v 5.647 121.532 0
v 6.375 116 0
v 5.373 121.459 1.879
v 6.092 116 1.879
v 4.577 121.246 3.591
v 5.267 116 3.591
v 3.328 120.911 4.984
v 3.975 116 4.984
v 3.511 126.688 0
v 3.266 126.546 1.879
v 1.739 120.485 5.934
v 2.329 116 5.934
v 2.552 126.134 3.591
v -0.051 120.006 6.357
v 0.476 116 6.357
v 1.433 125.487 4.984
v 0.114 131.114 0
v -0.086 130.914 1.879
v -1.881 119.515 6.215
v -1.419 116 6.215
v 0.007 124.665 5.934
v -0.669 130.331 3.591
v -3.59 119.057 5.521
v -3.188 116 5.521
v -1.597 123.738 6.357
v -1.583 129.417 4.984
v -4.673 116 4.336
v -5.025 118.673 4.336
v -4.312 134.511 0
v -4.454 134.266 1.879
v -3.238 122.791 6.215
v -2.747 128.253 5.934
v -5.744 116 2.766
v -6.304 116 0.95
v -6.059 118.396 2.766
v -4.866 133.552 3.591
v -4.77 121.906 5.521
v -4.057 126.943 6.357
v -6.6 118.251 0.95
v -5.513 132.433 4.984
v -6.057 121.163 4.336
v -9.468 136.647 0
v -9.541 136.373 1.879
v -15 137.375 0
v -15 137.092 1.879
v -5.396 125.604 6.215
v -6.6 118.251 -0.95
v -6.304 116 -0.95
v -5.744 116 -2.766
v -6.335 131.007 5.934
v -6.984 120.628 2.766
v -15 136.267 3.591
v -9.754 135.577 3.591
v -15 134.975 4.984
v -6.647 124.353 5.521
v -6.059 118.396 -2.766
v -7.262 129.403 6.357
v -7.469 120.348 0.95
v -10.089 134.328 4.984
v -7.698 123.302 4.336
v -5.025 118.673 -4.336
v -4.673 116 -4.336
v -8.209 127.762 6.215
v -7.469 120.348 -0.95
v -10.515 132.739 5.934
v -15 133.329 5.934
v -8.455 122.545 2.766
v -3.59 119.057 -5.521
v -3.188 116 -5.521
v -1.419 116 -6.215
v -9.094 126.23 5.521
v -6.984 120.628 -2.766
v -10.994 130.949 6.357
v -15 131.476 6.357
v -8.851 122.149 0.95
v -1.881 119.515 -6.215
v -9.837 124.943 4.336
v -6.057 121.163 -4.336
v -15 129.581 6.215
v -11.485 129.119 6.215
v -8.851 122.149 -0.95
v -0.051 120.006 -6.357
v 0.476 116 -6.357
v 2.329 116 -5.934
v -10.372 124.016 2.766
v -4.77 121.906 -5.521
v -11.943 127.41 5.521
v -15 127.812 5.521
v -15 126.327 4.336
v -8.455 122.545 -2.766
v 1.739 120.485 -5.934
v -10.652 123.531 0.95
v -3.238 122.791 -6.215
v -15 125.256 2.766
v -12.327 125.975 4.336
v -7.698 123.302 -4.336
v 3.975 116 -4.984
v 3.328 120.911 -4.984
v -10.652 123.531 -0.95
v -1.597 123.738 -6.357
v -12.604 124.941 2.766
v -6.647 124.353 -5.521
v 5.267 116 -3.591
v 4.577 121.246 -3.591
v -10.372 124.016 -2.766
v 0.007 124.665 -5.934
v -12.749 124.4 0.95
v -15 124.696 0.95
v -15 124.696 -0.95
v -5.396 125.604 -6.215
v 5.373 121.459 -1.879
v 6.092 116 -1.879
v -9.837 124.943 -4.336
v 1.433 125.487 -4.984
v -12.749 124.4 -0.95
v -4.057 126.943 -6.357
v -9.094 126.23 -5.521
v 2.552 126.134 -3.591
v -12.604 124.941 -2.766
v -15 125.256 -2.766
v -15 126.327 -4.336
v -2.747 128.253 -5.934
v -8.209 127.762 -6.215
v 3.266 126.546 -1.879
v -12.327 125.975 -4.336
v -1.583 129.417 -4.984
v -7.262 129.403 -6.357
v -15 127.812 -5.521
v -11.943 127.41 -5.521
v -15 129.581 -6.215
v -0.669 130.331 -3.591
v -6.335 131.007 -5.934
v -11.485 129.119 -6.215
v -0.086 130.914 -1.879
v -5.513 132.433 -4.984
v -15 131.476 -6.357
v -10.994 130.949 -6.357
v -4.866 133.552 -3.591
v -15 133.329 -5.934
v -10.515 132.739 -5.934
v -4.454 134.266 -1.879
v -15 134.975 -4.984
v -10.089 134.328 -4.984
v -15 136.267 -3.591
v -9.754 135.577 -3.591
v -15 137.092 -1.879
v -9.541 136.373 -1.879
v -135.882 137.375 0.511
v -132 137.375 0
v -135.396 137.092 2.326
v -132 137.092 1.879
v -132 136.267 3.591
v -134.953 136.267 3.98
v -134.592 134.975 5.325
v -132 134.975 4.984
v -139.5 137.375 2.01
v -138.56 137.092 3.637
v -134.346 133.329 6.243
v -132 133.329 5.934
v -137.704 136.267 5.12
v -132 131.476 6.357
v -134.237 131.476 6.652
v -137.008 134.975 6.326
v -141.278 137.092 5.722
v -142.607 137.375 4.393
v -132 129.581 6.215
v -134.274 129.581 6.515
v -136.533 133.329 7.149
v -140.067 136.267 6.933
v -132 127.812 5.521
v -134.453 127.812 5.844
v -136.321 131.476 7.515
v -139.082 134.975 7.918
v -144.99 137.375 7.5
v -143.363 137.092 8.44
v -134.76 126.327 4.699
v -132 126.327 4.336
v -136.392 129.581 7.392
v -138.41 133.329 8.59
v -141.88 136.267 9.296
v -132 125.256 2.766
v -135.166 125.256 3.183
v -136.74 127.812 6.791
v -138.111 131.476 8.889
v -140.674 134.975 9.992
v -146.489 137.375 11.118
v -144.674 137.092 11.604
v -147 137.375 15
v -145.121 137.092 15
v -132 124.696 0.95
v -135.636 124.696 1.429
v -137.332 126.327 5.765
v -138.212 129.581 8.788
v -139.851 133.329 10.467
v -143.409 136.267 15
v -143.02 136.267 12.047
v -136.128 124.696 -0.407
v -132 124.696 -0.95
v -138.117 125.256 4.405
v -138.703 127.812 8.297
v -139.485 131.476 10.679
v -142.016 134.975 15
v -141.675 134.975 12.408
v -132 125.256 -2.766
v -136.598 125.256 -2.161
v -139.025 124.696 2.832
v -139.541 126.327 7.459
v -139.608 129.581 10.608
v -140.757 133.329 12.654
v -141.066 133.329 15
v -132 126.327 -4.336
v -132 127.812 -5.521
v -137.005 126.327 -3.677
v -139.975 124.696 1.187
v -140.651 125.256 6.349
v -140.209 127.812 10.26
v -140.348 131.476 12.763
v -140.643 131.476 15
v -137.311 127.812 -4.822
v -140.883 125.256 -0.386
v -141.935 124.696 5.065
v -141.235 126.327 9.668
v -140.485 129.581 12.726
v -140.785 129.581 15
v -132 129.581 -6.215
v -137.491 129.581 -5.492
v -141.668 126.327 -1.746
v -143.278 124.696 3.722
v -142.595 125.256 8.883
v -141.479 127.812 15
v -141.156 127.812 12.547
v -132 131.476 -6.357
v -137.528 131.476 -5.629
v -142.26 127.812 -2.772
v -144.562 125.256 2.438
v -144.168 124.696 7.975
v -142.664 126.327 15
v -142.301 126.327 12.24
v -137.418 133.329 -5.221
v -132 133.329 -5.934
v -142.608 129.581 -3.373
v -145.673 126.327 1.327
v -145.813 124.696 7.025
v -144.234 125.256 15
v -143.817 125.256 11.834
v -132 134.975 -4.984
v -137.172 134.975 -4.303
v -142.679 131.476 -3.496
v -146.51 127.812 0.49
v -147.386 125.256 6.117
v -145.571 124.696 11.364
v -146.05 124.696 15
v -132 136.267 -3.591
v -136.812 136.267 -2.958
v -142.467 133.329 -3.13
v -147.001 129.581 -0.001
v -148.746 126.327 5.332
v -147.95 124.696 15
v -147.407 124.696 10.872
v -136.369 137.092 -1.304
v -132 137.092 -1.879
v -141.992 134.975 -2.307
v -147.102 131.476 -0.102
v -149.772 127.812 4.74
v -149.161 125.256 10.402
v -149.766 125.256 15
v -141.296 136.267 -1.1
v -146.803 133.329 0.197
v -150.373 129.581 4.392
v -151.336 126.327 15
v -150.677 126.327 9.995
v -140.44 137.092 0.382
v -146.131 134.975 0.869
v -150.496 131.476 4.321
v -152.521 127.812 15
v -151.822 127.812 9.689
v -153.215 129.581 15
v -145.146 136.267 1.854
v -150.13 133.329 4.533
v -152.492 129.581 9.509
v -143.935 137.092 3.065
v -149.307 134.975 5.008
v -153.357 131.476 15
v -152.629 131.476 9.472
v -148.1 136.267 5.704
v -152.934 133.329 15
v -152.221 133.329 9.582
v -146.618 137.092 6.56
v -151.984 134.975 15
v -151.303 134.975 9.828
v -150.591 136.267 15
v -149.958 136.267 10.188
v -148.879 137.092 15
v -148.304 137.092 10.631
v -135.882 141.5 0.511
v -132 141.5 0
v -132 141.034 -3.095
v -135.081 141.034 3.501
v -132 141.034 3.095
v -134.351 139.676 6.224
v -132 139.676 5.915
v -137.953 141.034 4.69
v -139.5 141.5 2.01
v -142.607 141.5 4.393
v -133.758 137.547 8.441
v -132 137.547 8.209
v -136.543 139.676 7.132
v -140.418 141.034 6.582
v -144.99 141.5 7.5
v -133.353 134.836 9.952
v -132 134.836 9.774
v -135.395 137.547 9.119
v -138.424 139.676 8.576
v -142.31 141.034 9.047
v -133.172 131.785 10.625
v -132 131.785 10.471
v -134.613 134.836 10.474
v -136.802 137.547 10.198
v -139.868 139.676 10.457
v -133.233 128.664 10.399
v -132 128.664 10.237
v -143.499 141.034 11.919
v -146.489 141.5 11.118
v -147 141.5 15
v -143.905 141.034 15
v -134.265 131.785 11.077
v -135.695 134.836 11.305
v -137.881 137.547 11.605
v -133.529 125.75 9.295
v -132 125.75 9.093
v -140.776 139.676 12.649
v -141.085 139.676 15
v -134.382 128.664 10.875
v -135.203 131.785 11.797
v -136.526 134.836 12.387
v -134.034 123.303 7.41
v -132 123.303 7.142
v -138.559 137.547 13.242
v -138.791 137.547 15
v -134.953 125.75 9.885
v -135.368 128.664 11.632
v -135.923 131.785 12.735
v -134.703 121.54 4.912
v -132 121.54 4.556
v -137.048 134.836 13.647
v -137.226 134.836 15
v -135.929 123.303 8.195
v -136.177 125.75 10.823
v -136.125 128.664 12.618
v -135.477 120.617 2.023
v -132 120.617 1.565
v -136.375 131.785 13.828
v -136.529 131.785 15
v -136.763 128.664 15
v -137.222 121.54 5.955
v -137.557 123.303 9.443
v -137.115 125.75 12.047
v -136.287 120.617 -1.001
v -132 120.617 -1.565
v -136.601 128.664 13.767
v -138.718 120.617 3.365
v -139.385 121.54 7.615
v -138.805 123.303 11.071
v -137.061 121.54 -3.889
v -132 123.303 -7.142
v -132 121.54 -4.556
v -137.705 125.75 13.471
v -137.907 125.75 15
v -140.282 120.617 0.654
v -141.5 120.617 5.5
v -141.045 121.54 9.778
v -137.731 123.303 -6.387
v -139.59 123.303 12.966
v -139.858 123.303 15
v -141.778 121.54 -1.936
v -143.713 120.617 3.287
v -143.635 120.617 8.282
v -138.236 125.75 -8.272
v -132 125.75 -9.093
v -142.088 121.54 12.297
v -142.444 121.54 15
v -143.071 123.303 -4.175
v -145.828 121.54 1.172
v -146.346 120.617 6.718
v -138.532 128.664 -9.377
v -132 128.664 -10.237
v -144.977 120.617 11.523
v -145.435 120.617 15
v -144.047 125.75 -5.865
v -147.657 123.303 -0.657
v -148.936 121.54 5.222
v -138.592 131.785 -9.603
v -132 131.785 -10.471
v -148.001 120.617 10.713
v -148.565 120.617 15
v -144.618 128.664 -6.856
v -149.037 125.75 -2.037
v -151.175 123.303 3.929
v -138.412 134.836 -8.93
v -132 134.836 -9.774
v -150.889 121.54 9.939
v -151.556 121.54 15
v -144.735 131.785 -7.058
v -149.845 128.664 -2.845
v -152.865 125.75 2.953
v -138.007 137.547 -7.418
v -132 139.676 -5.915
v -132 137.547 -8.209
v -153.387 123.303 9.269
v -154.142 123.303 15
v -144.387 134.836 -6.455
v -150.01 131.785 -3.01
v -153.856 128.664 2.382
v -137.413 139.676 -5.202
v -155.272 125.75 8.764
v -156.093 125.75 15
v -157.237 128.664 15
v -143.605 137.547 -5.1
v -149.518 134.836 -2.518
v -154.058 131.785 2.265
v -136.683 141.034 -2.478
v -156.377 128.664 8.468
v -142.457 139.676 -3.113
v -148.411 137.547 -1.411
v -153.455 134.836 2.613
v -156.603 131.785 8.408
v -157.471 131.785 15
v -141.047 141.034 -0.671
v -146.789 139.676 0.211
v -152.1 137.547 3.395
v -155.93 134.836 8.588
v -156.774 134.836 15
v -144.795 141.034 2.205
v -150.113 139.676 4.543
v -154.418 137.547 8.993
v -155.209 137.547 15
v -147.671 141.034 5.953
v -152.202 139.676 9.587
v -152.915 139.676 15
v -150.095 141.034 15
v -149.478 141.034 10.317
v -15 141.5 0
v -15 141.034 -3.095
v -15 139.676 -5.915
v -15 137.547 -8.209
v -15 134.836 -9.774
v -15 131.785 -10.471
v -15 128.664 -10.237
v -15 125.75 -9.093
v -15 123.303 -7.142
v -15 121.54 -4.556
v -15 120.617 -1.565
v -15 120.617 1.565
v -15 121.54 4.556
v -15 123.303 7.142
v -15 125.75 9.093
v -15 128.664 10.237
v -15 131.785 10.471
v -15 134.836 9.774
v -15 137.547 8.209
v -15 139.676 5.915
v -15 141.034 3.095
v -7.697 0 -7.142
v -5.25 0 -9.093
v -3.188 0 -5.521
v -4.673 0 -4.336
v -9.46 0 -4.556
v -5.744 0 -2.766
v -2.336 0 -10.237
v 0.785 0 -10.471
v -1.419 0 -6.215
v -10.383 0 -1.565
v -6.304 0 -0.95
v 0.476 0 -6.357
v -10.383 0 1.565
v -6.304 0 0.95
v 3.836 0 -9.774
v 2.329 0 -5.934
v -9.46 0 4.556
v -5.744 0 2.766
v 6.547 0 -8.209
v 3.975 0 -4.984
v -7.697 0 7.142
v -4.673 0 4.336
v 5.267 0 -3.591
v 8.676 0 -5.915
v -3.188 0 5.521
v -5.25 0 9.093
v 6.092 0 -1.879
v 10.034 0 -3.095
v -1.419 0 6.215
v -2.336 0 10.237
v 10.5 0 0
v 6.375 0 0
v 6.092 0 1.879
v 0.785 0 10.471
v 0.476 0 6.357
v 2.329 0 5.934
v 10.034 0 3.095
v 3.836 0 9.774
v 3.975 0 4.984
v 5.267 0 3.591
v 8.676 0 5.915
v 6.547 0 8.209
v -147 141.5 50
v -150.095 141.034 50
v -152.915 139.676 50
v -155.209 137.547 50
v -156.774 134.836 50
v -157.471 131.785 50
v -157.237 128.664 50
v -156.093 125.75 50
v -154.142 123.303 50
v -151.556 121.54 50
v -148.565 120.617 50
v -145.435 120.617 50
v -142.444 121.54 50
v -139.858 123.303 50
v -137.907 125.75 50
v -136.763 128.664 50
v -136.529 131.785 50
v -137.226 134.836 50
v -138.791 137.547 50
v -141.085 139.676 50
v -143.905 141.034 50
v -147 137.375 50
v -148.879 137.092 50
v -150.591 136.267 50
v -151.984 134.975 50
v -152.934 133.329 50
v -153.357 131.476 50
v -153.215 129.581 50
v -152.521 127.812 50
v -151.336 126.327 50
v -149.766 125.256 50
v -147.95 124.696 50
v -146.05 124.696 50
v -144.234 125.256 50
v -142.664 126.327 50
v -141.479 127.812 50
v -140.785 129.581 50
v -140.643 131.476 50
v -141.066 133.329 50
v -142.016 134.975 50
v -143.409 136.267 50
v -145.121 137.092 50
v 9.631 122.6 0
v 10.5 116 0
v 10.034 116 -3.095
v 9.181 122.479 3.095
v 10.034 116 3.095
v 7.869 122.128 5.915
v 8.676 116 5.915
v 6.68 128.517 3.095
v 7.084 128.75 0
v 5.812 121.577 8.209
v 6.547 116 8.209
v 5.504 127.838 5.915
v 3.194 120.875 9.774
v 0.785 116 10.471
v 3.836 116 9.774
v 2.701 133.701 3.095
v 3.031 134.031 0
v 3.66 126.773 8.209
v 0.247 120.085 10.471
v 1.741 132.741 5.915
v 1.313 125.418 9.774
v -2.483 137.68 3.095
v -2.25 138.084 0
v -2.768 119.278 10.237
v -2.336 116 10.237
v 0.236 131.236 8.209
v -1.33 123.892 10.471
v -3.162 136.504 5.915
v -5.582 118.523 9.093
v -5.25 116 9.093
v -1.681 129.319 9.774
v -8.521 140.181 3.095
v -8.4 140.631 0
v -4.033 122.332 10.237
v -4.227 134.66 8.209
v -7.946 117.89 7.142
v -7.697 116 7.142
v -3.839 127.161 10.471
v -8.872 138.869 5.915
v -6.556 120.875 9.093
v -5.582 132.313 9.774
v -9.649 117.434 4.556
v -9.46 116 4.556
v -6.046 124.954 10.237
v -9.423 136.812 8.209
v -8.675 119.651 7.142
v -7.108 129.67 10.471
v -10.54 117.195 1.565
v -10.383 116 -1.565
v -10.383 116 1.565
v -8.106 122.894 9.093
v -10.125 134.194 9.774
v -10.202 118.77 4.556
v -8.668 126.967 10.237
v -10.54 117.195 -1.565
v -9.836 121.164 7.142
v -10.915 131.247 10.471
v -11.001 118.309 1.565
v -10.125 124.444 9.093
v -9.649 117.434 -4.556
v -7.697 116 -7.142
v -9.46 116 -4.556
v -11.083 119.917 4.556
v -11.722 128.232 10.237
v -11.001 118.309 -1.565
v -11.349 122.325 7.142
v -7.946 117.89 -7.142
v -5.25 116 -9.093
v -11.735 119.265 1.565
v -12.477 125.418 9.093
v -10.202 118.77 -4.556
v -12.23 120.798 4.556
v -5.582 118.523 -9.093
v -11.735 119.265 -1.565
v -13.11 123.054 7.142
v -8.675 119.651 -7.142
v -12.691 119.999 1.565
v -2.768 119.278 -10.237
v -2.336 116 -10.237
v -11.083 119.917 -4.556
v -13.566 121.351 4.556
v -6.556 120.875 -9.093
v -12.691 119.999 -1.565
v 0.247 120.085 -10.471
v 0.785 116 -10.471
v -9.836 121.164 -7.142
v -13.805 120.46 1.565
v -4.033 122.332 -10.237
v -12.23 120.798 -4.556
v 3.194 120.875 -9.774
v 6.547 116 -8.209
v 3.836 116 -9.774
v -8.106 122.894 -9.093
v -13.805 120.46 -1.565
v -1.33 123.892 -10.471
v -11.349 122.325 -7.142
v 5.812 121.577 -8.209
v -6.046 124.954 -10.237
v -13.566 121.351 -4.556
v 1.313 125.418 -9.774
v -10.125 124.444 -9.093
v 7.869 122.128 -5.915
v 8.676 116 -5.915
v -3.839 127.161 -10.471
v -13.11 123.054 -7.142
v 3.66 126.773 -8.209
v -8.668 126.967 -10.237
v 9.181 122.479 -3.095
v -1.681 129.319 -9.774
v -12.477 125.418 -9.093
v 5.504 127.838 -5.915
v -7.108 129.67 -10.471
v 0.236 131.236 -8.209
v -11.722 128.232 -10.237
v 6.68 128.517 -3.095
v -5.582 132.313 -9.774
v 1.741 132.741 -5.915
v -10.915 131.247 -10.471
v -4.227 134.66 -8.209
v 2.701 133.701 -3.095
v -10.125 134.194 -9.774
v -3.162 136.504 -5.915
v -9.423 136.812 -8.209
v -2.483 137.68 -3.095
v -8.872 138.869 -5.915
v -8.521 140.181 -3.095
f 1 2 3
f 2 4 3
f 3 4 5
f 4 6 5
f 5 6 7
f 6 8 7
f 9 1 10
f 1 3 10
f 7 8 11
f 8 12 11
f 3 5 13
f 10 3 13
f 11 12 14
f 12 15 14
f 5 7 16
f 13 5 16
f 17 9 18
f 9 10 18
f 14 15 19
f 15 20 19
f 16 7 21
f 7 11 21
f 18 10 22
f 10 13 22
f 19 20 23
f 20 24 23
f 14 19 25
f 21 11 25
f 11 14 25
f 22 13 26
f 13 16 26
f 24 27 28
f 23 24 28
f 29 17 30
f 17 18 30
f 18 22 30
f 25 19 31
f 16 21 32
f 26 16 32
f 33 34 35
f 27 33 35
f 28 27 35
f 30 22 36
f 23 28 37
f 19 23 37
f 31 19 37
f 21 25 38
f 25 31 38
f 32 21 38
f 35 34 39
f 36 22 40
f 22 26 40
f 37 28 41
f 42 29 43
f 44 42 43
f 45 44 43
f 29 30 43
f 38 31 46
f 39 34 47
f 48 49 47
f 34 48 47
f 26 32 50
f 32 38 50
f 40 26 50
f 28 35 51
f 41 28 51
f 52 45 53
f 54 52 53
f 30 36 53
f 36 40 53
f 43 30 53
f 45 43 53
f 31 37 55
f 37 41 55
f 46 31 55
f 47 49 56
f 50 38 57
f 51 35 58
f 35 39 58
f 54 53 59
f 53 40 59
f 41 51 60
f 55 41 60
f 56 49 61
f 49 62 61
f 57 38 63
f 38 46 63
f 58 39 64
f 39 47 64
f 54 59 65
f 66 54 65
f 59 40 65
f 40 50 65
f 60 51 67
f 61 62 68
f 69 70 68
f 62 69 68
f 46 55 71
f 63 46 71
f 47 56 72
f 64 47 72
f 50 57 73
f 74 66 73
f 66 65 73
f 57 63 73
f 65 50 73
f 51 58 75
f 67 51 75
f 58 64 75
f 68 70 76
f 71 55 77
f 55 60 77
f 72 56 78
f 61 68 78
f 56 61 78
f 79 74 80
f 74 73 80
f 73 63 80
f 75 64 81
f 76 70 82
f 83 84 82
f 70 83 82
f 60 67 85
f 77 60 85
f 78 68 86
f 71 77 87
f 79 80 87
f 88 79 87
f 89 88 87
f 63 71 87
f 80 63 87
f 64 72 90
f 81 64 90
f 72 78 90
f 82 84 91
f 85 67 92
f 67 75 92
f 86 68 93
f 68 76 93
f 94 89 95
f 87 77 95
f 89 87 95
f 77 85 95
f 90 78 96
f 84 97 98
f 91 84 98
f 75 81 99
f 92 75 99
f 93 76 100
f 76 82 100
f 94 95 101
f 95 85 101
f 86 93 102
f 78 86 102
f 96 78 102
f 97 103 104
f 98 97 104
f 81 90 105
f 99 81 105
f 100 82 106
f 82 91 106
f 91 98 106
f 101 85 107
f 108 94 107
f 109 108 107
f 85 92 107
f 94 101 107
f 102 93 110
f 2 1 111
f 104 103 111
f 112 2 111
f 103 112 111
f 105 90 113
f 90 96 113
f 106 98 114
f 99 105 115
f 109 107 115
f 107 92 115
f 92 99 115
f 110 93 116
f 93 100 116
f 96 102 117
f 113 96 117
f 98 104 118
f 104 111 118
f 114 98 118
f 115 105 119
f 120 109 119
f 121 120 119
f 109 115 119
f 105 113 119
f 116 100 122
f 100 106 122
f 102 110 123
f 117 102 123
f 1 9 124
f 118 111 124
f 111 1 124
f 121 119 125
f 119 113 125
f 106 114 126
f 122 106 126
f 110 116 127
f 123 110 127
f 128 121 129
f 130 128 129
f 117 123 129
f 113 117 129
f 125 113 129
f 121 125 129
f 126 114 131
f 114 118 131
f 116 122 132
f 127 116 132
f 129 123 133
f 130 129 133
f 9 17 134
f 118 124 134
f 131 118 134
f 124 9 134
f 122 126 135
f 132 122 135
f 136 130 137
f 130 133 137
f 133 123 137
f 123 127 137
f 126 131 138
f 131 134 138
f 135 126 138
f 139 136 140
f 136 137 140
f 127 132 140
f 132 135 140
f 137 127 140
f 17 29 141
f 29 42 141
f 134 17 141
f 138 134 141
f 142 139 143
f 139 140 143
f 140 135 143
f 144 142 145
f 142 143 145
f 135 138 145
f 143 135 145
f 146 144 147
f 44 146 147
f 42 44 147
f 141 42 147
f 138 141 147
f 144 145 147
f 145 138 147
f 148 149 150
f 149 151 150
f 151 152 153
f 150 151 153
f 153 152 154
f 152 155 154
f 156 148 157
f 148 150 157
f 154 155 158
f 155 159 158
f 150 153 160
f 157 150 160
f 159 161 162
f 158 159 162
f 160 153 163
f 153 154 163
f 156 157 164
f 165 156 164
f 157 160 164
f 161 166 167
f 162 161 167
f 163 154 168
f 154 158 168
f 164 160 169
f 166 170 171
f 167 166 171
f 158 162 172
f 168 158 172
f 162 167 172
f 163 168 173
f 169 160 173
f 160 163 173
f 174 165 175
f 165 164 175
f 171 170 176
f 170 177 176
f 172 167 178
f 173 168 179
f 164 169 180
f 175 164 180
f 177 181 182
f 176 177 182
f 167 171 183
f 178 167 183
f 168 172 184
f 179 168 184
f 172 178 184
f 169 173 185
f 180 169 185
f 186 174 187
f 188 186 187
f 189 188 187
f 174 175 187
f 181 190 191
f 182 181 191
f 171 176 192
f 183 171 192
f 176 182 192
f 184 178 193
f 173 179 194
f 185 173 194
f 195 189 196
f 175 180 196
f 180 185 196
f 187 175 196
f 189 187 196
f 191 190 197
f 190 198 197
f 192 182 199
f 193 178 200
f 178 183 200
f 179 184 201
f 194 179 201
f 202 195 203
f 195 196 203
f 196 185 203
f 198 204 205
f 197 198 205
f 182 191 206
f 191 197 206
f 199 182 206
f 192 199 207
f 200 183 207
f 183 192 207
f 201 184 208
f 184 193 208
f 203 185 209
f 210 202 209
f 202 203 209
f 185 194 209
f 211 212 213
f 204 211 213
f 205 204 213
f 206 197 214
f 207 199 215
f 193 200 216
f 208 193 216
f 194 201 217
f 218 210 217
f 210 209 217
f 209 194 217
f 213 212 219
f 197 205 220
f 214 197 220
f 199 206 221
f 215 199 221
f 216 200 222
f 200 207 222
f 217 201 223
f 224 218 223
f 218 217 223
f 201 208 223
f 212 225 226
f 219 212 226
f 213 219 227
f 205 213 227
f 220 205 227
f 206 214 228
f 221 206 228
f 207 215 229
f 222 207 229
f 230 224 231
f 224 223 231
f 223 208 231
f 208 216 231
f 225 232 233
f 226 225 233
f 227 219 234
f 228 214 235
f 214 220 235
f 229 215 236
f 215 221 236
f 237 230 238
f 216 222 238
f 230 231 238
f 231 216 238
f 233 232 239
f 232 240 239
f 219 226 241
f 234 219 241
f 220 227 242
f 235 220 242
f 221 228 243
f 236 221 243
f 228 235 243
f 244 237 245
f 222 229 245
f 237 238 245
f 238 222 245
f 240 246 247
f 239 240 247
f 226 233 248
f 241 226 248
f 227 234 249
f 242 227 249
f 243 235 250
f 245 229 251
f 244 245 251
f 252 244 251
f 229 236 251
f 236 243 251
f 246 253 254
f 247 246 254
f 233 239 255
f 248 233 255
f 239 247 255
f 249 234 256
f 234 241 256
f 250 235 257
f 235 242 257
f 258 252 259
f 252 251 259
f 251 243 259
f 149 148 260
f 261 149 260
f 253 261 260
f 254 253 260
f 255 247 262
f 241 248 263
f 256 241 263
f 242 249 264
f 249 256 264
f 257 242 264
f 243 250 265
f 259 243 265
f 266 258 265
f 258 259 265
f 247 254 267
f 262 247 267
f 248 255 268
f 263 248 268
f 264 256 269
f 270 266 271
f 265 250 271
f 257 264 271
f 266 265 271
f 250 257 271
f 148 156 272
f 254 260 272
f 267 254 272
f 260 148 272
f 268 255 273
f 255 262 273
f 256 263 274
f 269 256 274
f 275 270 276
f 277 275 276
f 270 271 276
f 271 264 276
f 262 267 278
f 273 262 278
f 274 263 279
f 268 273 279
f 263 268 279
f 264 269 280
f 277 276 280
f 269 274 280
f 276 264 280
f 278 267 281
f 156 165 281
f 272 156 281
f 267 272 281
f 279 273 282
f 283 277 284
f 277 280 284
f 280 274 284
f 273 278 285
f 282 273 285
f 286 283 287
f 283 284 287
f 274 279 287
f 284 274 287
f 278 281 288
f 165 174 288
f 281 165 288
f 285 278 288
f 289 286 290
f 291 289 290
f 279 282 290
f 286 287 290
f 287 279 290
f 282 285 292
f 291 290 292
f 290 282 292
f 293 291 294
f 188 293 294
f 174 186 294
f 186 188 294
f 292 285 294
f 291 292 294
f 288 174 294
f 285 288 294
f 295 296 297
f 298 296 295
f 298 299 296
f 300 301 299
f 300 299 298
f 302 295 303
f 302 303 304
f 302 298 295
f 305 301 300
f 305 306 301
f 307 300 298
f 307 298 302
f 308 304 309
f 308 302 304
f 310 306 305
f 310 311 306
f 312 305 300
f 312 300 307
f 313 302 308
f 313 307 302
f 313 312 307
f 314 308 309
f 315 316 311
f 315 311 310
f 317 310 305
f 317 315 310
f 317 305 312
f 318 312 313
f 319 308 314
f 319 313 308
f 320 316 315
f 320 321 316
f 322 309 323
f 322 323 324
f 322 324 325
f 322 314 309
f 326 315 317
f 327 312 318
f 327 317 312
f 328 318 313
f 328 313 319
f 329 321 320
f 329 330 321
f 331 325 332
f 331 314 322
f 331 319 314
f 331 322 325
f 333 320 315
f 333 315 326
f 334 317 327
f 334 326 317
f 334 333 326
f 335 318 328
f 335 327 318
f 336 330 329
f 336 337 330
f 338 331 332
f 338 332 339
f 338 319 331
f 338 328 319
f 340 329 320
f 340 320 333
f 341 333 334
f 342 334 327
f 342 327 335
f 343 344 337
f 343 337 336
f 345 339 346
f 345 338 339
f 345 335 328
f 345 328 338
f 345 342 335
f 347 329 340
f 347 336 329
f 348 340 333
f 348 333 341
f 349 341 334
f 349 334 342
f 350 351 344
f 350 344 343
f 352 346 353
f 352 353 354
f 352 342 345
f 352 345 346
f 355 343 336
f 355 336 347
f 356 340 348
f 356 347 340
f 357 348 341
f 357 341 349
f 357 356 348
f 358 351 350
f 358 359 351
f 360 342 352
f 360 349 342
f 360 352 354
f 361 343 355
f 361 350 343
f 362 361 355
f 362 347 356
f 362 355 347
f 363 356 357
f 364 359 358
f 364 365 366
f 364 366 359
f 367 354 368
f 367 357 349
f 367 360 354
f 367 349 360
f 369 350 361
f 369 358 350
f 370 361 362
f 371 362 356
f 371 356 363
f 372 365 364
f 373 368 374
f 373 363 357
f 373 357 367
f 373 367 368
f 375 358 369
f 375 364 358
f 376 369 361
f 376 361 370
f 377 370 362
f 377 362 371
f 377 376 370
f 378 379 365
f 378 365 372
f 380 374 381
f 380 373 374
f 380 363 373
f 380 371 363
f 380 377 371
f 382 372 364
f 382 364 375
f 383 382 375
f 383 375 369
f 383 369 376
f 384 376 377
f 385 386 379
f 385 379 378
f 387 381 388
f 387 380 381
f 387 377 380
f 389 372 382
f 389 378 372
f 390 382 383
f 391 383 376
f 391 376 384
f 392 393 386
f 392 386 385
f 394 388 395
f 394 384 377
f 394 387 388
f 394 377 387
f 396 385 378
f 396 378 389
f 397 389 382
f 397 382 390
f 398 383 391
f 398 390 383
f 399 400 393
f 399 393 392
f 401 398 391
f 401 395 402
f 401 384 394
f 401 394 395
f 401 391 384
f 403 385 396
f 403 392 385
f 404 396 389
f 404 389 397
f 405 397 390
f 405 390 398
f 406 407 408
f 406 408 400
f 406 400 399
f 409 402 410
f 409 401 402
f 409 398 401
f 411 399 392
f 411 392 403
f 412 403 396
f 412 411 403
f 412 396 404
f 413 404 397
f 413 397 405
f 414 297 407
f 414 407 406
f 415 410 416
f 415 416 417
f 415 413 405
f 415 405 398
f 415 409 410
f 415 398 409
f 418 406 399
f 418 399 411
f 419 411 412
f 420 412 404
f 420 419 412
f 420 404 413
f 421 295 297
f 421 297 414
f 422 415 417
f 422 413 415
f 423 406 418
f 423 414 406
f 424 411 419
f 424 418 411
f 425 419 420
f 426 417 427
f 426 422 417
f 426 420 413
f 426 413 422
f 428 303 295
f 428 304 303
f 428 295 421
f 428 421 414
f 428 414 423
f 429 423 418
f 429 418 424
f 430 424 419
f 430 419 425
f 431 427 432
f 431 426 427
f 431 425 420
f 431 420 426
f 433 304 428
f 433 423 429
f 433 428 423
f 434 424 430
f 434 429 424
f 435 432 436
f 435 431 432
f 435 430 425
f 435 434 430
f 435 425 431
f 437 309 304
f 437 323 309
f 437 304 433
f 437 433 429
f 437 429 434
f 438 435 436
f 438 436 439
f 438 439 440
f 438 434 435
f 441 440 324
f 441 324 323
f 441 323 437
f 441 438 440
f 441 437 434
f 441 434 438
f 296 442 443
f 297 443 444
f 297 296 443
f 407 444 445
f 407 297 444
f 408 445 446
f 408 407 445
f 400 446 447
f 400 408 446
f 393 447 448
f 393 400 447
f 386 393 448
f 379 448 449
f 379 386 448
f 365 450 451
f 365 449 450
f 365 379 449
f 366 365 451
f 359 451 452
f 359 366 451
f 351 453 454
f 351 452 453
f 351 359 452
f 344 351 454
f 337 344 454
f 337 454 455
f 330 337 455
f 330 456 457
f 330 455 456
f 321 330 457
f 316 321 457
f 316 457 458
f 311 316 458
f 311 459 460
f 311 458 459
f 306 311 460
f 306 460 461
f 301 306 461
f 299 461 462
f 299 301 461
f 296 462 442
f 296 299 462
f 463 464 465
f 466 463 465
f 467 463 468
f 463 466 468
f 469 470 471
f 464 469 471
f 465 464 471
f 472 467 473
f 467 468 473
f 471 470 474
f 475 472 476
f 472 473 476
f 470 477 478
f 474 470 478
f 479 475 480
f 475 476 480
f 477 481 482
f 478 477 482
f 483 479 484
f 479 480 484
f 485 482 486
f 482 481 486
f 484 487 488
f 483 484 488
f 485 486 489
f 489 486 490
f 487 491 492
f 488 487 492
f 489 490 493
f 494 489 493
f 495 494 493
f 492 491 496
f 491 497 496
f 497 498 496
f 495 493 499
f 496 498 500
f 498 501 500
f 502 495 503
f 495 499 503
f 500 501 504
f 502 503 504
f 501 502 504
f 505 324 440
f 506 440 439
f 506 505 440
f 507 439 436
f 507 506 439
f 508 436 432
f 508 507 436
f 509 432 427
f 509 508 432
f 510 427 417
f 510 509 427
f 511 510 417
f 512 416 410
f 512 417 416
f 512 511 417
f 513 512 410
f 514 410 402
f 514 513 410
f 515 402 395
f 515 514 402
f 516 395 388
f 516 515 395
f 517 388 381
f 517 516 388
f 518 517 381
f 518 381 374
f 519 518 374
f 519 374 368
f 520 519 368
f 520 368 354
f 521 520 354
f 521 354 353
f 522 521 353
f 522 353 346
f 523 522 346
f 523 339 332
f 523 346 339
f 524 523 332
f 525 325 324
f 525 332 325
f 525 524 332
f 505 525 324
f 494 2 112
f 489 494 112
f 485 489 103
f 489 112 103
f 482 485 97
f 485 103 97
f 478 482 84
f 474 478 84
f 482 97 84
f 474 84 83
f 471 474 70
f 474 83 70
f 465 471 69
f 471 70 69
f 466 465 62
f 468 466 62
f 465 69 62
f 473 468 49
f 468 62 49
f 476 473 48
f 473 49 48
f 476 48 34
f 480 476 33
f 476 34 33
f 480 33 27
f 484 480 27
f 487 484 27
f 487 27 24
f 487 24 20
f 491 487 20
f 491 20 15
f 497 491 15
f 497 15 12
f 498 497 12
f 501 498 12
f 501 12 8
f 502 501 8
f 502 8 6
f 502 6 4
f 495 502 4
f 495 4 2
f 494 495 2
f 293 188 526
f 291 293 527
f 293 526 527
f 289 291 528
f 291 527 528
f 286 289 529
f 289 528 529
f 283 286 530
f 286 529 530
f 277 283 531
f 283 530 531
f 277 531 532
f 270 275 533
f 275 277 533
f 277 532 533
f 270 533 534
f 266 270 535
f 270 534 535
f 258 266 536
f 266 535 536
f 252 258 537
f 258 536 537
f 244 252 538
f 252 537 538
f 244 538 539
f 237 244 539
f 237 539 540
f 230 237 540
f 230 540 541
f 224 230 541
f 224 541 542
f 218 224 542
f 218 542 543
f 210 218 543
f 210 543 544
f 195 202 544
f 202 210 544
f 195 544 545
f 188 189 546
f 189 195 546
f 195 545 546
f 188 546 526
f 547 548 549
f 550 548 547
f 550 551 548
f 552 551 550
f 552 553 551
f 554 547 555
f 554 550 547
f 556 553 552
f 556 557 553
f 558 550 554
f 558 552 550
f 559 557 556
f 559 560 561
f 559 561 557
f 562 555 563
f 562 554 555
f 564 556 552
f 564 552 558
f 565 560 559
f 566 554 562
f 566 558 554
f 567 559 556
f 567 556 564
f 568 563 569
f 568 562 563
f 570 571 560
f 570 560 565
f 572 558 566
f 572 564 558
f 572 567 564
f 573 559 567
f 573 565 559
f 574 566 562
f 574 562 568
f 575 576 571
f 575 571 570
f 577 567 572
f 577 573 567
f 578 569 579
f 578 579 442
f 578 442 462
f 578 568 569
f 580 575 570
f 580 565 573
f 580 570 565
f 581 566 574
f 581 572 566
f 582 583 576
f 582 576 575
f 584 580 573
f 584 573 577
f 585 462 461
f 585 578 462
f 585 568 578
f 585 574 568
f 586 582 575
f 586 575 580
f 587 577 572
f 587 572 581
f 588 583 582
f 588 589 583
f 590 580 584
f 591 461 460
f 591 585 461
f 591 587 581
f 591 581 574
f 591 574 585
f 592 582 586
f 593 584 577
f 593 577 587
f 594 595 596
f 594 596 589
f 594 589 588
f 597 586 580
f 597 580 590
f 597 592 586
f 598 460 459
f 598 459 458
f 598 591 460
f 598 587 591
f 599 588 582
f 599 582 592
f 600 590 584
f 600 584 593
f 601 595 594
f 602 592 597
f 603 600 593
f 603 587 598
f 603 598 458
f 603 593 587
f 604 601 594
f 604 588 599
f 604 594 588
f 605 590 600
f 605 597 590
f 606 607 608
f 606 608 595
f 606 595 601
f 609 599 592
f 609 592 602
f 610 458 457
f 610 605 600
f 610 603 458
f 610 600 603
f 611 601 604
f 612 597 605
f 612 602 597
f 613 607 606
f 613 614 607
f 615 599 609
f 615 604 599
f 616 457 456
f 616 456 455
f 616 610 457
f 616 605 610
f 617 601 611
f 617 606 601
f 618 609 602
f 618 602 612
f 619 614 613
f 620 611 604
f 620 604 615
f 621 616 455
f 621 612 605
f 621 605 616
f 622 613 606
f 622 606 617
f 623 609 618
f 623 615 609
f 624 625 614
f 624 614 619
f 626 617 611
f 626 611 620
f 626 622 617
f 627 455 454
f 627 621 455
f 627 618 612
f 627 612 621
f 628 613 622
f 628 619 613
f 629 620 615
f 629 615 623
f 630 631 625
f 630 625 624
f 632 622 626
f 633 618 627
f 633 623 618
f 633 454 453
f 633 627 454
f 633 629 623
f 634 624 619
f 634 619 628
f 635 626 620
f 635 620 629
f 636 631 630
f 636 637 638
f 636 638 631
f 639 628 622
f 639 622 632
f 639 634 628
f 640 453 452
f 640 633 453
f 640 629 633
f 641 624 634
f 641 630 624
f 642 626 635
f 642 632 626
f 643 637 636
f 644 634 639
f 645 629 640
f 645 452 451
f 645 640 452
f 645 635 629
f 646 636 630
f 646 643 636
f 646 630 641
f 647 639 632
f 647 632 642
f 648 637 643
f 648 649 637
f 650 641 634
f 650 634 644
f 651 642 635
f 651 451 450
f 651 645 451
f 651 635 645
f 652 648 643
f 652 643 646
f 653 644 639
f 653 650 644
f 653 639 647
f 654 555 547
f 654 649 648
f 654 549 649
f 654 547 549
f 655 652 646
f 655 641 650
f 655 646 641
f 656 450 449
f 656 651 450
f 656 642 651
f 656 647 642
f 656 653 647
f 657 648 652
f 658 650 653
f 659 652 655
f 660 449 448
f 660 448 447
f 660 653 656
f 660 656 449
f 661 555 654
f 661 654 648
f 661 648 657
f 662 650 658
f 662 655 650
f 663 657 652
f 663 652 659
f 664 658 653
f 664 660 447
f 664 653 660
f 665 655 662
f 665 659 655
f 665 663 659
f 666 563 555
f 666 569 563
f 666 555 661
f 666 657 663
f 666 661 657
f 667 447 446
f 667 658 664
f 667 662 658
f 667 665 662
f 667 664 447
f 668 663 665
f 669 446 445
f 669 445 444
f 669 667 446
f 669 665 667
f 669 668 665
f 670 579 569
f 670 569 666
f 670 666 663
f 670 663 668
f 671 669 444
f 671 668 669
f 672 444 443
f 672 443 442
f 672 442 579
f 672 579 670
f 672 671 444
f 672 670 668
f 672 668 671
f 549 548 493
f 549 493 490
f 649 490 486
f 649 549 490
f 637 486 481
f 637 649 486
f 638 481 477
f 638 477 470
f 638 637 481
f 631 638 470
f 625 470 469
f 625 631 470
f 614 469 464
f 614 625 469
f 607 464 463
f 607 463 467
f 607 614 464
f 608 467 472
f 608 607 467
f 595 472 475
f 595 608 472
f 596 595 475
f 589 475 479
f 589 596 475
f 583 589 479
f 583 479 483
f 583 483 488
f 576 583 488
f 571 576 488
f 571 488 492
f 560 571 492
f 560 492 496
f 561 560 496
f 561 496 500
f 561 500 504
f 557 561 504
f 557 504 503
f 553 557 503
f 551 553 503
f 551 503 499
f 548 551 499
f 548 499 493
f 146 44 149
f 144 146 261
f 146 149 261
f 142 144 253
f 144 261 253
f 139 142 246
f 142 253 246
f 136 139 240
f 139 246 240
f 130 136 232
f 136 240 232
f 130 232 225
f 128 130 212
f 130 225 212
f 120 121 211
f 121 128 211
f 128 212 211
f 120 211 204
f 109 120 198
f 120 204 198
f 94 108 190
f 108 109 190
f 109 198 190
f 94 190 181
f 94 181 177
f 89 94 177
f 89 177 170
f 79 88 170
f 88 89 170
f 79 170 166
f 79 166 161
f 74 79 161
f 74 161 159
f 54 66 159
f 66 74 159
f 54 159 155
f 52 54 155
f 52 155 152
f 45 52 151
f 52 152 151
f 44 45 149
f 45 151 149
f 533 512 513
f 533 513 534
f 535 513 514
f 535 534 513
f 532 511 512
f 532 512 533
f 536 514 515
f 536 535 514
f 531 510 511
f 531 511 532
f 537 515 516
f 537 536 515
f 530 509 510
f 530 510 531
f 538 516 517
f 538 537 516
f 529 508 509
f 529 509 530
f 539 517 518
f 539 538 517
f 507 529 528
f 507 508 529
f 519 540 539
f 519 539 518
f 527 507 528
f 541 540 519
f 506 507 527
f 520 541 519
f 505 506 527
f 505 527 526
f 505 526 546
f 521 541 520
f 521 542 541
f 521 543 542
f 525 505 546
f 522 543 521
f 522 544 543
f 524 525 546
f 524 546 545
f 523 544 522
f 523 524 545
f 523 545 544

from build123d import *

# Parameters (mm, degrees)
SKETCH1_R   = 10.5
SKETCH1_R_2 = 6.375


with BuildPart() as part:
    # Sweep1: sweep along a curve in space
    with BuildLine() as sweep1_path:
        Line((0, 0, 0), (0, 116, 0))
        ThreePointArc((0, 116, 0), (-4.393398282, 126.606601718, 0), (-15, 131, 0))
        Line((-15, 131, 0), (-132, 131, 0))
        ThreePointArc((-132, 131, 0), (-142.606601718, 131, 4.393398282), (-147, 131, 15))
        Line((-147, 131, 15), (-147, 131, 50))
    # Sketch1 → Sweep1 (sweep)
    with BuildSketch(Plane(origin=(0, 0, 0), x_dir=(1, 0, 0), z_dir=(0, 1, 0))):
        Circle(SKETCH1_R)
        Circle(SKETCH1_R_2, mode=Mode.SUBTRACT)
    sweep(path=sweep1_path.line)


solid = part.part
